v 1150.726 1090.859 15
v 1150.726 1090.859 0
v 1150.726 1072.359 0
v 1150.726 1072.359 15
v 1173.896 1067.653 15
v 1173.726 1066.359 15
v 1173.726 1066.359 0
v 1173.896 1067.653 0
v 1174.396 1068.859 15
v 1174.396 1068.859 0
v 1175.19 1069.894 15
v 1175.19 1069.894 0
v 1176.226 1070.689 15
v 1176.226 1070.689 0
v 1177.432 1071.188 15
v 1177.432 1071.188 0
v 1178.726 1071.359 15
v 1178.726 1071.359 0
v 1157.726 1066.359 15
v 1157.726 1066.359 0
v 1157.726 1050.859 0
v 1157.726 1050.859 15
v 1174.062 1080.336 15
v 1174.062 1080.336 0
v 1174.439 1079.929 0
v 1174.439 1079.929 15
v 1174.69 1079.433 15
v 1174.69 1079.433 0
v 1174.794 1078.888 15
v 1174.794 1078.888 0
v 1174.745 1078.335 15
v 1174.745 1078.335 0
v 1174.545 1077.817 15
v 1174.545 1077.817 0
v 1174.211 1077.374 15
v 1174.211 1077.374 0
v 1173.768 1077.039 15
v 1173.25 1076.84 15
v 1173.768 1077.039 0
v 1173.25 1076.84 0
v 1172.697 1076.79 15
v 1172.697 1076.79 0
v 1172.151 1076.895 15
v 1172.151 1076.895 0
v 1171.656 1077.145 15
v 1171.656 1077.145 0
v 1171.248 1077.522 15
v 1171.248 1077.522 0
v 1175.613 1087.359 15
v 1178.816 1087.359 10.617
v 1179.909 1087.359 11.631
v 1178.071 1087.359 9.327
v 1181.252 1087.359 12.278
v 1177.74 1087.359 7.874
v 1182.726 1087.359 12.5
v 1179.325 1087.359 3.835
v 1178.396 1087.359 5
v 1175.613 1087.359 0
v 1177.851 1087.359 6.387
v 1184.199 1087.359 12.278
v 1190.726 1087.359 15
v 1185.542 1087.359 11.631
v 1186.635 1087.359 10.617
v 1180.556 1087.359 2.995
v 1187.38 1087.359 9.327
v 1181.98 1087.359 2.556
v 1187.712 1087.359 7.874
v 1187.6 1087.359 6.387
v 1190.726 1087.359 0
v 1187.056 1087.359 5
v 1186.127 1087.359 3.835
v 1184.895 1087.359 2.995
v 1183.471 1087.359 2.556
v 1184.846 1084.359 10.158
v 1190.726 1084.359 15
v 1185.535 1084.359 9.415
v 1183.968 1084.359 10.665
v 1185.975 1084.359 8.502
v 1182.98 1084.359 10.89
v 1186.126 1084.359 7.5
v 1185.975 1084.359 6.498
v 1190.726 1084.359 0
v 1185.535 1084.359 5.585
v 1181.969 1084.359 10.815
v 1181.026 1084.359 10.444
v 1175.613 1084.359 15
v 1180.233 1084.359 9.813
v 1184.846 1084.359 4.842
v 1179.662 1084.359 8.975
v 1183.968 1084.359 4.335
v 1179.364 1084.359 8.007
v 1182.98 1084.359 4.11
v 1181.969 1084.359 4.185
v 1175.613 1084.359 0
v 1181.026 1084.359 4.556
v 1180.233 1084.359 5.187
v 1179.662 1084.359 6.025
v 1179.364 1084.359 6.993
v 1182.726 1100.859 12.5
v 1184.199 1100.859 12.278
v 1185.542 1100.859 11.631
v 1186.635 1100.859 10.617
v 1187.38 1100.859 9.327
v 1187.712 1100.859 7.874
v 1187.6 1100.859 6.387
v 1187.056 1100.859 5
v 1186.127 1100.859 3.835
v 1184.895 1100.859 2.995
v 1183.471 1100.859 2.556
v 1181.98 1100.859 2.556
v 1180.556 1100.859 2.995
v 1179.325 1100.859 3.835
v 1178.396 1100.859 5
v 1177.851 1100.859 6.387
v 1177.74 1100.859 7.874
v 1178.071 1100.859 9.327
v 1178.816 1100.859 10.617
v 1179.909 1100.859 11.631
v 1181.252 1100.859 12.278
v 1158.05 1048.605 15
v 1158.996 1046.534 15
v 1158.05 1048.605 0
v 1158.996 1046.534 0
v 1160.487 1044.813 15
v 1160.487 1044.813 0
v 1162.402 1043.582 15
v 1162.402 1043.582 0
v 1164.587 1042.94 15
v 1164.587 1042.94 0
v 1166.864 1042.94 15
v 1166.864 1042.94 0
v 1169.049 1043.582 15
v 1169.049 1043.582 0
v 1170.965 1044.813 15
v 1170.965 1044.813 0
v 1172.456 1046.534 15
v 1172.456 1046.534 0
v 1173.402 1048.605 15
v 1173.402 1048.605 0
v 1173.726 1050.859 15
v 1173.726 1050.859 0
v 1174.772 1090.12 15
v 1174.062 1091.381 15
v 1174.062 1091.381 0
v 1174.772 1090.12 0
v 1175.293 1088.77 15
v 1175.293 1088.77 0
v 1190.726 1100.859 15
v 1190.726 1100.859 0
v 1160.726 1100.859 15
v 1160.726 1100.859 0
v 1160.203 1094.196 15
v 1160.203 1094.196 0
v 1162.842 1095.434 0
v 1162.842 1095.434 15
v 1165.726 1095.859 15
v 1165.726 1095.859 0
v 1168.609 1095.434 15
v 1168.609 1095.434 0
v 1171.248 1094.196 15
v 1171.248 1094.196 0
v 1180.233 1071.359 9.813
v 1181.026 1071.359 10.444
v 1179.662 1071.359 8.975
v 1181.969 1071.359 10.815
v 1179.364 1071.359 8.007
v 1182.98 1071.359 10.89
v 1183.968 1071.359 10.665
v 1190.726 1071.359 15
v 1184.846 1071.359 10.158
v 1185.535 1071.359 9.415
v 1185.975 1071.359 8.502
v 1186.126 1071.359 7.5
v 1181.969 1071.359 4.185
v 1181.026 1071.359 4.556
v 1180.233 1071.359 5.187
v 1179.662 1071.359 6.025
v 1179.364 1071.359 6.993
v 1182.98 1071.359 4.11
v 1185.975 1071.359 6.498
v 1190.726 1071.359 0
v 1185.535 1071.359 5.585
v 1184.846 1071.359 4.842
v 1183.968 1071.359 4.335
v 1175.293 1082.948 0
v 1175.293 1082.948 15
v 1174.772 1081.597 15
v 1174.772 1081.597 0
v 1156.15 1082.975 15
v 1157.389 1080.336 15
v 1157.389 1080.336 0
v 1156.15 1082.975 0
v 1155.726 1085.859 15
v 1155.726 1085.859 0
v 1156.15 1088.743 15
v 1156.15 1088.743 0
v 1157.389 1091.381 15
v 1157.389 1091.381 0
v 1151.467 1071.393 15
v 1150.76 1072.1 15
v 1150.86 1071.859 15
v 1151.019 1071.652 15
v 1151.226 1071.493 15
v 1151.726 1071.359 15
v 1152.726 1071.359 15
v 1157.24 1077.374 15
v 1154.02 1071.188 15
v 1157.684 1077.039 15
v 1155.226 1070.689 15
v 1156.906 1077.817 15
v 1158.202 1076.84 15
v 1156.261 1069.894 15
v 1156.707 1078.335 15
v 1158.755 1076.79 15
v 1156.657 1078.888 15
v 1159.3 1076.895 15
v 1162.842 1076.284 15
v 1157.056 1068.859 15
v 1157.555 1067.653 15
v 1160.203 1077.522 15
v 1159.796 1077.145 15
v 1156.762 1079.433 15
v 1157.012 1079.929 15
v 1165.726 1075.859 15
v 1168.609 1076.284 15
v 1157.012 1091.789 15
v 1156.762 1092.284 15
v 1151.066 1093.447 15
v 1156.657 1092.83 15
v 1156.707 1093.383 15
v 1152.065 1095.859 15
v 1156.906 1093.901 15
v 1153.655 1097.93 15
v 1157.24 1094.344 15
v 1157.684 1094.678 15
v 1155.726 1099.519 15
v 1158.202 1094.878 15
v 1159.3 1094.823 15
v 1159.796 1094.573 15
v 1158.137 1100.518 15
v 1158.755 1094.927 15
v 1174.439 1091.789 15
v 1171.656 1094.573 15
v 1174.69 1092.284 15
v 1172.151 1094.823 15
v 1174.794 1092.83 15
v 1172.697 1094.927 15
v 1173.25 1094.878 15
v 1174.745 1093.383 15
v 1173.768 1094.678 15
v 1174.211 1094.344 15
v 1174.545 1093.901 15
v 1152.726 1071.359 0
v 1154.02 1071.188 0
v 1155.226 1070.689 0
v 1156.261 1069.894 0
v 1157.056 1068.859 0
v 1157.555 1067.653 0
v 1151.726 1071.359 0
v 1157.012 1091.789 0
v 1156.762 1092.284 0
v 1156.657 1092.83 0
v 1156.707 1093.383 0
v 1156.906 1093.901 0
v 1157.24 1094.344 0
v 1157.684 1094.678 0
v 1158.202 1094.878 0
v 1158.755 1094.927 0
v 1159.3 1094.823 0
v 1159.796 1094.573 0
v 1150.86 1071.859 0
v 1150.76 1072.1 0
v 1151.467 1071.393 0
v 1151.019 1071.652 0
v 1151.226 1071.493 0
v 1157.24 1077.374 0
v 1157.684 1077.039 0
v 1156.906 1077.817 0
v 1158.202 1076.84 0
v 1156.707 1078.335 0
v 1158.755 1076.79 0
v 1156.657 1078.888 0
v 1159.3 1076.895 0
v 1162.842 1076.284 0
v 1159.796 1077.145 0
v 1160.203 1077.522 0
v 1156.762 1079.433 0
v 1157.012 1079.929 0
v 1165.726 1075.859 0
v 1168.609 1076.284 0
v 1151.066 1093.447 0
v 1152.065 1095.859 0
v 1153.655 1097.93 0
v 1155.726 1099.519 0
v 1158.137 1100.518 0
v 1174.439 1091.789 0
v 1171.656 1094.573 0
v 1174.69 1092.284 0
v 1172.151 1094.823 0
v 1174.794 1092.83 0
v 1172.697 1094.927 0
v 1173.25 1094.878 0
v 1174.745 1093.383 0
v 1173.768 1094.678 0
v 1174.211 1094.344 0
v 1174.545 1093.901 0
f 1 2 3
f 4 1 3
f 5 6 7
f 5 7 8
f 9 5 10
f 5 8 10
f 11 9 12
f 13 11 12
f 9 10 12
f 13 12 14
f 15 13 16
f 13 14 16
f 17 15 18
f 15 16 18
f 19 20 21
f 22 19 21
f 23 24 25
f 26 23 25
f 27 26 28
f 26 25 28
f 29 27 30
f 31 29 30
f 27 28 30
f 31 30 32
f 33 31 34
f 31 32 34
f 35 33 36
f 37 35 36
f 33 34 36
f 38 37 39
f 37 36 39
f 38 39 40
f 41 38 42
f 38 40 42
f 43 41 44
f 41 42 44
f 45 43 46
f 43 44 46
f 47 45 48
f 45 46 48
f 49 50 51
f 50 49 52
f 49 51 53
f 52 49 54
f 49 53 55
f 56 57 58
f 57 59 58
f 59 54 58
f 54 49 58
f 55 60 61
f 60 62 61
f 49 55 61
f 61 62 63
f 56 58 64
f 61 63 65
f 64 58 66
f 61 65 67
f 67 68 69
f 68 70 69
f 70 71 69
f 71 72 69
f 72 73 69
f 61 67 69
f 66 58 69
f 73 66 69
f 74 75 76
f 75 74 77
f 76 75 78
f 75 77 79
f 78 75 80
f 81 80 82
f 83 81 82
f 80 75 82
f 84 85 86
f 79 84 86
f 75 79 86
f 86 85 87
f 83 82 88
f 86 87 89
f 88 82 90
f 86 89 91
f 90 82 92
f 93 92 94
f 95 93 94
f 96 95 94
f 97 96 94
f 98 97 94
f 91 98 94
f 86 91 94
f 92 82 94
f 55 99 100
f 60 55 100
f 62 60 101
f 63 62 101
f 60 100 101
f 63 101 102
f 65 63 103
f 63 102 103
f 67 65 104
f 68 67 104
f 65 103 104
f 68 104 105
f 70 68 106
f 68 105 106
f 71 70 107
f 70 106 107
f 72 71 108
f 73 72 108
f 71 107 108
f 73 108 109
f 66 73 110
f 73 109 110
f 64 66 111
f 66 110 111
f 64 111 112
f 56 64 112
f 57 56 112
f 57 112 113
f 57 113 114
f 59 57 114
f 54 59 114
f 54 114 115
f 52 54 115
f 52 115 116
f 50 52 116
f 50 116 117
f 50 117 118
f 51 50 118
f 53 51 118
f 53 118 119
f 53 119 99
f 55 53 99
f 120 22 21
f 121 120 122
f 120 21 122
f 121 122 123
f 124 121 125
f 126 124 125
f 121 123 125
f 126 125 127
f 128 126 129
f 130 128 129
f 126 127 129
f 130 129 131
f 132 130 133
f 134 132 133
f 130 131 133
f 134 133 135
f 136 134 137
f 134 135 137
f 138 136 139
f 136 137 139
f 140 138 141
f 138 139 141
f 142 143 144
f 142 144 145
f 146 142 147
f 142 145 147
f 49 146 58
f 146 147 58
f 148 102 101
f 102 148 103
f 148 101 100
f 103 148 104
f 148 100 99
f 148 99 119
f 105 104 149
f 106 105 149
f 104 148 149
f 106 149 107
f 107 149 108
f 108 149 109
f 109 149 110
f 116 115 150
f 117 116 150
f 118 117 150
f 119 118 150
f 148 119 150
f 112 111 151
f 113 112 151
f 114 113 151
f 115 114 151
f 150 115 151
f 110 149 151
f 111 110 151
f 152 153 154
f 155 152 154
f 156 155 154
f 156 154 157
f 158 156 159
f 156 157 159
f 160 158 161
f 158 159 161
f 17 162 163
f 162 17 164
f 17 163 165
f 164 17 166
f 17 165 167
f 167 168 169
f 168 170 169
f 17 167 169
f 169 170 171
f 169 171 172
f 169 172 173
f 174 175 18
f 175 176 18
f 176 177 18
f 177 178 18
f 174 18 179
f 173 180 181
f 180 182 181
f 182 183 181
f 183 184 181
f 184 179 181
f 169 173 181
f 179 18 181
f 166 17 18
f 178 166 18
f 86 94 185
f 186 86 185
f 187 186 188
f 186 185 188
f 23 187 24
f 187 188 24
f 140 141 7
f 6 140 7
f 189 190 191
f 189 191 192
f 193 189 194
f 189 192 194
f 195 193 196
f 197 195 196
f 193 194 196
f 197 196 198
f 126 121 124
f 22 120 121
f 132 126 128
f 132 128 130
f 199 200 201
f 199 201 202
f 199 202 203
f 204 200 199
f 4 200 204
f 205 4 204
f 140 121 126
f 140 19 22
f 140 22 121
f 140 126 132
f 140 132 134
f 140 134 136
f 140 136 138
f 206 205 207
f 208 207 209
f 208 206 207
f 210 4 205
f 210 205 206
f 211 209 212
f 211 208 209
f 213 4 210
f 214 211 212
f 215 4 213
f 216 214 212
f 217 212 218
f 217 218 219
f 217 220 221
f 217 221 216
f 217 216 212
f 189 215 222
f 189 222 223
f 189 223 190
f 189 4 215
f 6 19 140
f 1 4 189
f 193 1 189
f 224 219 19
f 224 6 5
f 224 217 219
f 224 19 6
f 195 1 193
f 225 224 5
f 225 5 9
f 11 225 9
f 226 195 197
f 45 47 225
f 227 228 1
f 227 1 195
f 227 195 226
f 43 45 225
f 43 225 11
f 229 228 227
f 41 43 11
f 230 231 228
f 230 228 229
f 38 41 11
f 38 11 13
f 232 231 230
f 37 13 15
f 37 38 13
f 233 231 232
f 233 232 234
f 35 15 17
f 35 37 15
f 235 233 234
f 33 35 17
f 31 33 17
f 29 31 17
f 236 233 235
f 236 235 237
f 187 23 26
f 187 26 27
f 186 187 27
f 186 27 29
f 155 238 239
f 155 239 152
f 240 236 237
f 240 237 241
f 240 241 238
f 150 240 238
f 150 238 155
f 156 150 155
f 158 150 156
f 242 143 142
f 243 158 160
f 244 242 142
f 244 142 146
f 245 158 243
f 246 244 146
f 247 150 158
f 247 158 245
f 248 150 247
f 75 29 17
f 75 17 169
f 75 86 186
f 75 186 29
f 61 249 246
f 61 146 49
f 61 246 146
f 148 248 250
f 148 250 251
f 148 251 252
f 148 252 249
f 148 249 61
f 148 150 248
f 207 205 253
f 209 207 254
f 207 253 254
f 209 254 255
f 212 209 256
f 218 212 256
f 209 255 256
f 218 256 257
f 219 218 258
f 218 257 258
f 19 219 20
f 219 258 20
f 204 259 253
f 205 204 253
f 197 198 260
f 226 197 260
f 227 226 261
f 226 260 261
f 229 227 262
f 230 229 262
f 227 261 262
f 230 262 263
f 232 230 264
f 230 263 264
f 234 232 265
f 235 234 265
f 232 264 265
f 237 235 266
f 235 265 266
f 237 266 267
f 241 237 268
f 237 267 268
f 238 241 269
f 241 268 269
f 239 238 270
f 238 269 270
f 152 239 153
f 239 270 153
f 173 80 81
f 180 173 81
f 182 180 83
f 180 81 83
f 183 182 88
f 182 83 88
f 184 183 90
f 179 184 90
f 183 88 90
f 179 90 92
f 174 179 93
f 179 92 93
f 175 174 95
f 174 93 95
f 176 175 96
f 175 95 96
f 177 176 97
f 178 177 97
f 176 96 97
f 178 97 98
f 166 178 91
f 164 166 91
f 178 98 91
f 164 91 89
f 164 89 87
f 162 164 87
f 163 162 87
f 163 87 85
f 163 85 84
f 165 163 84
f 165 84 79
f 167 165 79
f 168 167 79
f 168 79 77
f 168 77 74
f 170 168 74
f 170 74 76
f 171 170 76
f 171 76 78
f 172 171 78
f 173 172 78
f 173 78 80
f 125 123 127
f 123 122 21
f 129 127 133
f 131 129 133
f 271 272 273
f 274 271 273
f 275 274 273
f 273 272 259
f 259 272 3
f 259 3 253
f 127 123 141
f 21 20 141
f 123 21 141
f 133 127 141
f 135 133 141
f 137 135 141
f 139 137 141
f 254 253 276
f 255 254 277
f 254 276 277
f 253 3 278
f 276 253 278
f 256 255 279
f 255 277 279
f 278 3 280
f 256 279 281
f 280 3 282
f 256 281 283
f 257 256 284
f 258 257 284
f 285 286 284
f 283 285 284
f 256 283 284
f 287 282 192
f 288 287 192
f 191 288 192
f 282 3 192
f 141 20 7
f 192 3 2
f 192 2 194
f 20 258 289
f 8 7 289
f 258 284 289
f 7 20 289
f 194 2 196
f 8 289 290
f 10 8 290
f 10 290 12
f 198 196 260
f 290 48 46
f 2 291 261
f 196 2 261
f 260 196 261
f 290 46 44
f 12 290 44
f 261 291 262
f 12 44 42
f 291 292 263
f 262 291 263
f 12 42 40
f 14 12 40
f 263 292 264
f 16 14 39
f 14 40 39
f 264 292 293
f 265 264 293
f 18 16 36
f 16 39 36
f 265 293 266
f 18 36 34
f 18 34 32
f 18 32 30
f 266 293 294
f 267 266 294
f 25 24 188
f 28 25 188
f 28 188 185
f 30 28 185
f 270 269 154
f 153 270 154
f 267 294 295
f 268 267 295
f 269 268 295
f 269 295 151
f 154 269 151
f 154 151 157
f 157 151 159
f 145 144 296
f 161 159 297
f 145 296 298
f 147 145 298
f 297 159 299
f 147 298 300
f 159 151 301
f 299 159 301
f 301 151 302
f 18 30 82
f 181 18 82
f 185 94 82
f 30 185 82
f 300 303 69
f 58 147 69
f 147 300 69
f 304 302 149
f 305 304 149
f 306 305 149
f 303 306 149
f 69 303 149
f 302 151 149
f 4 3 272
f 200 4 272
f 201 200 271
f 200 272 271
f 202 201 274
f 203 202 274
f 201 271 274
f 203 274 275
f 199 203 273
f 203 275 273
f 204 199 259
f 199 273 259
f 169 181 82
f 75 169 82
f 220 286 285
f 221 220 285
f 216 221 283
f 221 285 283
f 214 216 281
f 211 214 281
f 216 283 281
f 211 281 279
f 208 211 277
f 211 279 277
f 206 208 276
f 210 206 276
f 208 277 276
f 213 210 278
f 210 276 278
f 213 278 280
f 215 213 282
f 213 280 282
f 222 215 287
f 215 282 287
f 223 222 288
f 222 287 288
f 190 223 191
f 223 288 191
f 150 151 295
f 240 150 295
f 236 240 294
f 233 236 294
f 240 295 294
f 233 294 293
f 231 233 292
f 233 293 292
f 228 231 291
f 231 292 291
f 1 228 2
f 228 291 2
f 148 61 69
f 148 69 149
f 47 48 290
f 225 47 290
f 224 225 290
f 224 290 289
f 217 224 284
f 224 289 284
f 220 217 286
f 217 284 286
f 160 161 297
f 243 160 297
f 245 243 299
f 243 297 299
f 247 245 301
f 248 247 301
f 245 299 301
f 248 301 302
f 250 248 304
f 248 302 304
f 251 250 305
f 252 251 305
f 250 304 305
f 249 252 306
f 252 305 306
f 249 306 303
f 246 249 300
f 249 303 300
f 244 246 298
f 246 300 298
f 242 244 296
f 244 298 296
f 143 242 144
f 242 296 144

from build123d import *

# Parameters (mm, degrees)
EXTRUDE_1_DEPTH     = 15
SKETCH_2_R          = 3.4
CUT_EXTRUDE_2_DEPTH = 1193.231762859
SKETCH_3_R          = 5
CUT_EXTRUDE_3_DEPTH = 14


with BuildPart() as part:
    # 草图1 → 拉伸1 (new body)
    with BuildSketch(Plane.XY):
        with BuildLine():
            Line((1175.612511144, 1087.358821907), (1190.725651177, 1087.358821907))
            Line((1190.725651177, 1087.358821907), (1190.725651177, 1100.858821907))
            Line((1190.725651177, 1100.858821907), (1160.725651177, 1100.858821907))
            ThreePointArc((1160.725651177, 1100.858821907), (1153.654583365, 1097.929889719), (1150.725651177, 1090.858821907))
            Line((1150.725651177, 1090.858821907), (1150.725651177, 1072.358821907))
            ThreePointArc((1150.725651177, 1072.358821907), (1151.018544396, 1071.651715126), (1151.725651177, 1071.358821907))
            Line((1151.725651177, 1071.358821907), (1152.725651177, 1071.358821907))
            ThreePointArc((1152.725651177, 1071.358821907), (1156.261185083, 1069.894355813), (1157.725651177, 1066.358821907))
            Line((1157.725651177, 1066.358821907), (1157.725651177, 1050.858821907))
            ThreePointArc((1157.725651177, 1050.858821907), (1165.725651177, 1042.858821907), (1173.725651177, 1050.858821907))
            Line((1173.725651177, 1050.858821907), (1173.725651177, 1066.358821907))
            ThreePointArc((1173.725651177, 1066.358821907), (1175.190117271, 1069.894355813), (1178.725651177, 1071.358821907))
            Line((1178.725651177, 1071.358821907), (1190.725651177, 1071.358821907))
            Line((1190.725651177, 1071.358821907), (1190.725651177, 1084.358821907))
            Line((1190.725651177, 1084.358821907), (1175.612511144, 1084.358821907))
            ThreePointArc((1175.612511144, 1084.358821907), (1175.056800803, 1082.26304012), (1174.062422361, 1080.336300179))
            ThreePointArc((1174.062422361, 1080.336300179), (1174.210932551, 1077.373540533), (1171.248172905, 1077.522050723))
            ThreePointArc((1171.248172905, 1077.522050723), (1165.725651177, 1075.858821907), (1160.203129449, 1077.522050723))
            ThreePointArc((1160.203129449, 1077.522050723), (1157.240369803, 1077.373540533), (1157.388879993, 1080.336300179))
            ThreePointArc((1157.388879993, 1080.336300179), (1155.725651177, 1085.858821907), (1157.388879993, 1091.381343635))
            ThreePointArc((1157.388879993, 1091.381343635), (1157.240369803, 1094.344103281), (1160.203129449, 1094.195593091))
            ThreePointArc((1160.203129449, 1094.195593091), (1165.725651177, 1095.858821907), (1171.248172905, 1094.195593091))
            ThreePointArc((1171.248172905, 1094.195593091), (1174.210932551, 1094.344103281), (1174.062422361, 1091.381343635))
            ThreePointArc((1174.062422361, 1091.381343635), (1175.056800803, 1089.454603694), (1175.612511144, 1087.358821907))
        make_face()
    extrude(amount=EXTRUDE_1_DEPTH)

    # 草图2 → 拉伸2 (cut, through all)
    with BuildSketch(Plane(origin=(0, 1100.858821907, 0), x_dir=(1, 0, 0), z_dir=(0, 1, 0))):
        with Locations((1182.725651177, -7.5)):
            Circle(SKETCH_2_R)
    extrude(amount=-CUT_EXTRUDE_2_DEPTH, mode=Mode.SUBTRACT)

    # 草图3 → 拉伸3 (cut)
    with BuildSketch(Plane(origin=(0, 1100.858821907, 0), x_dir=(1, 0, 0), z_dir=(0, 1, 0))):
        with Locations(Location((1182.725651177, -7.5, 0), (0, 0, 270))):
            Circle(SKETCH_3_R)
    extrude(amount=-CUT_EXTRUDE_3_DEPTH, mode=Mode.SUBTRACT)


solid = part.part
